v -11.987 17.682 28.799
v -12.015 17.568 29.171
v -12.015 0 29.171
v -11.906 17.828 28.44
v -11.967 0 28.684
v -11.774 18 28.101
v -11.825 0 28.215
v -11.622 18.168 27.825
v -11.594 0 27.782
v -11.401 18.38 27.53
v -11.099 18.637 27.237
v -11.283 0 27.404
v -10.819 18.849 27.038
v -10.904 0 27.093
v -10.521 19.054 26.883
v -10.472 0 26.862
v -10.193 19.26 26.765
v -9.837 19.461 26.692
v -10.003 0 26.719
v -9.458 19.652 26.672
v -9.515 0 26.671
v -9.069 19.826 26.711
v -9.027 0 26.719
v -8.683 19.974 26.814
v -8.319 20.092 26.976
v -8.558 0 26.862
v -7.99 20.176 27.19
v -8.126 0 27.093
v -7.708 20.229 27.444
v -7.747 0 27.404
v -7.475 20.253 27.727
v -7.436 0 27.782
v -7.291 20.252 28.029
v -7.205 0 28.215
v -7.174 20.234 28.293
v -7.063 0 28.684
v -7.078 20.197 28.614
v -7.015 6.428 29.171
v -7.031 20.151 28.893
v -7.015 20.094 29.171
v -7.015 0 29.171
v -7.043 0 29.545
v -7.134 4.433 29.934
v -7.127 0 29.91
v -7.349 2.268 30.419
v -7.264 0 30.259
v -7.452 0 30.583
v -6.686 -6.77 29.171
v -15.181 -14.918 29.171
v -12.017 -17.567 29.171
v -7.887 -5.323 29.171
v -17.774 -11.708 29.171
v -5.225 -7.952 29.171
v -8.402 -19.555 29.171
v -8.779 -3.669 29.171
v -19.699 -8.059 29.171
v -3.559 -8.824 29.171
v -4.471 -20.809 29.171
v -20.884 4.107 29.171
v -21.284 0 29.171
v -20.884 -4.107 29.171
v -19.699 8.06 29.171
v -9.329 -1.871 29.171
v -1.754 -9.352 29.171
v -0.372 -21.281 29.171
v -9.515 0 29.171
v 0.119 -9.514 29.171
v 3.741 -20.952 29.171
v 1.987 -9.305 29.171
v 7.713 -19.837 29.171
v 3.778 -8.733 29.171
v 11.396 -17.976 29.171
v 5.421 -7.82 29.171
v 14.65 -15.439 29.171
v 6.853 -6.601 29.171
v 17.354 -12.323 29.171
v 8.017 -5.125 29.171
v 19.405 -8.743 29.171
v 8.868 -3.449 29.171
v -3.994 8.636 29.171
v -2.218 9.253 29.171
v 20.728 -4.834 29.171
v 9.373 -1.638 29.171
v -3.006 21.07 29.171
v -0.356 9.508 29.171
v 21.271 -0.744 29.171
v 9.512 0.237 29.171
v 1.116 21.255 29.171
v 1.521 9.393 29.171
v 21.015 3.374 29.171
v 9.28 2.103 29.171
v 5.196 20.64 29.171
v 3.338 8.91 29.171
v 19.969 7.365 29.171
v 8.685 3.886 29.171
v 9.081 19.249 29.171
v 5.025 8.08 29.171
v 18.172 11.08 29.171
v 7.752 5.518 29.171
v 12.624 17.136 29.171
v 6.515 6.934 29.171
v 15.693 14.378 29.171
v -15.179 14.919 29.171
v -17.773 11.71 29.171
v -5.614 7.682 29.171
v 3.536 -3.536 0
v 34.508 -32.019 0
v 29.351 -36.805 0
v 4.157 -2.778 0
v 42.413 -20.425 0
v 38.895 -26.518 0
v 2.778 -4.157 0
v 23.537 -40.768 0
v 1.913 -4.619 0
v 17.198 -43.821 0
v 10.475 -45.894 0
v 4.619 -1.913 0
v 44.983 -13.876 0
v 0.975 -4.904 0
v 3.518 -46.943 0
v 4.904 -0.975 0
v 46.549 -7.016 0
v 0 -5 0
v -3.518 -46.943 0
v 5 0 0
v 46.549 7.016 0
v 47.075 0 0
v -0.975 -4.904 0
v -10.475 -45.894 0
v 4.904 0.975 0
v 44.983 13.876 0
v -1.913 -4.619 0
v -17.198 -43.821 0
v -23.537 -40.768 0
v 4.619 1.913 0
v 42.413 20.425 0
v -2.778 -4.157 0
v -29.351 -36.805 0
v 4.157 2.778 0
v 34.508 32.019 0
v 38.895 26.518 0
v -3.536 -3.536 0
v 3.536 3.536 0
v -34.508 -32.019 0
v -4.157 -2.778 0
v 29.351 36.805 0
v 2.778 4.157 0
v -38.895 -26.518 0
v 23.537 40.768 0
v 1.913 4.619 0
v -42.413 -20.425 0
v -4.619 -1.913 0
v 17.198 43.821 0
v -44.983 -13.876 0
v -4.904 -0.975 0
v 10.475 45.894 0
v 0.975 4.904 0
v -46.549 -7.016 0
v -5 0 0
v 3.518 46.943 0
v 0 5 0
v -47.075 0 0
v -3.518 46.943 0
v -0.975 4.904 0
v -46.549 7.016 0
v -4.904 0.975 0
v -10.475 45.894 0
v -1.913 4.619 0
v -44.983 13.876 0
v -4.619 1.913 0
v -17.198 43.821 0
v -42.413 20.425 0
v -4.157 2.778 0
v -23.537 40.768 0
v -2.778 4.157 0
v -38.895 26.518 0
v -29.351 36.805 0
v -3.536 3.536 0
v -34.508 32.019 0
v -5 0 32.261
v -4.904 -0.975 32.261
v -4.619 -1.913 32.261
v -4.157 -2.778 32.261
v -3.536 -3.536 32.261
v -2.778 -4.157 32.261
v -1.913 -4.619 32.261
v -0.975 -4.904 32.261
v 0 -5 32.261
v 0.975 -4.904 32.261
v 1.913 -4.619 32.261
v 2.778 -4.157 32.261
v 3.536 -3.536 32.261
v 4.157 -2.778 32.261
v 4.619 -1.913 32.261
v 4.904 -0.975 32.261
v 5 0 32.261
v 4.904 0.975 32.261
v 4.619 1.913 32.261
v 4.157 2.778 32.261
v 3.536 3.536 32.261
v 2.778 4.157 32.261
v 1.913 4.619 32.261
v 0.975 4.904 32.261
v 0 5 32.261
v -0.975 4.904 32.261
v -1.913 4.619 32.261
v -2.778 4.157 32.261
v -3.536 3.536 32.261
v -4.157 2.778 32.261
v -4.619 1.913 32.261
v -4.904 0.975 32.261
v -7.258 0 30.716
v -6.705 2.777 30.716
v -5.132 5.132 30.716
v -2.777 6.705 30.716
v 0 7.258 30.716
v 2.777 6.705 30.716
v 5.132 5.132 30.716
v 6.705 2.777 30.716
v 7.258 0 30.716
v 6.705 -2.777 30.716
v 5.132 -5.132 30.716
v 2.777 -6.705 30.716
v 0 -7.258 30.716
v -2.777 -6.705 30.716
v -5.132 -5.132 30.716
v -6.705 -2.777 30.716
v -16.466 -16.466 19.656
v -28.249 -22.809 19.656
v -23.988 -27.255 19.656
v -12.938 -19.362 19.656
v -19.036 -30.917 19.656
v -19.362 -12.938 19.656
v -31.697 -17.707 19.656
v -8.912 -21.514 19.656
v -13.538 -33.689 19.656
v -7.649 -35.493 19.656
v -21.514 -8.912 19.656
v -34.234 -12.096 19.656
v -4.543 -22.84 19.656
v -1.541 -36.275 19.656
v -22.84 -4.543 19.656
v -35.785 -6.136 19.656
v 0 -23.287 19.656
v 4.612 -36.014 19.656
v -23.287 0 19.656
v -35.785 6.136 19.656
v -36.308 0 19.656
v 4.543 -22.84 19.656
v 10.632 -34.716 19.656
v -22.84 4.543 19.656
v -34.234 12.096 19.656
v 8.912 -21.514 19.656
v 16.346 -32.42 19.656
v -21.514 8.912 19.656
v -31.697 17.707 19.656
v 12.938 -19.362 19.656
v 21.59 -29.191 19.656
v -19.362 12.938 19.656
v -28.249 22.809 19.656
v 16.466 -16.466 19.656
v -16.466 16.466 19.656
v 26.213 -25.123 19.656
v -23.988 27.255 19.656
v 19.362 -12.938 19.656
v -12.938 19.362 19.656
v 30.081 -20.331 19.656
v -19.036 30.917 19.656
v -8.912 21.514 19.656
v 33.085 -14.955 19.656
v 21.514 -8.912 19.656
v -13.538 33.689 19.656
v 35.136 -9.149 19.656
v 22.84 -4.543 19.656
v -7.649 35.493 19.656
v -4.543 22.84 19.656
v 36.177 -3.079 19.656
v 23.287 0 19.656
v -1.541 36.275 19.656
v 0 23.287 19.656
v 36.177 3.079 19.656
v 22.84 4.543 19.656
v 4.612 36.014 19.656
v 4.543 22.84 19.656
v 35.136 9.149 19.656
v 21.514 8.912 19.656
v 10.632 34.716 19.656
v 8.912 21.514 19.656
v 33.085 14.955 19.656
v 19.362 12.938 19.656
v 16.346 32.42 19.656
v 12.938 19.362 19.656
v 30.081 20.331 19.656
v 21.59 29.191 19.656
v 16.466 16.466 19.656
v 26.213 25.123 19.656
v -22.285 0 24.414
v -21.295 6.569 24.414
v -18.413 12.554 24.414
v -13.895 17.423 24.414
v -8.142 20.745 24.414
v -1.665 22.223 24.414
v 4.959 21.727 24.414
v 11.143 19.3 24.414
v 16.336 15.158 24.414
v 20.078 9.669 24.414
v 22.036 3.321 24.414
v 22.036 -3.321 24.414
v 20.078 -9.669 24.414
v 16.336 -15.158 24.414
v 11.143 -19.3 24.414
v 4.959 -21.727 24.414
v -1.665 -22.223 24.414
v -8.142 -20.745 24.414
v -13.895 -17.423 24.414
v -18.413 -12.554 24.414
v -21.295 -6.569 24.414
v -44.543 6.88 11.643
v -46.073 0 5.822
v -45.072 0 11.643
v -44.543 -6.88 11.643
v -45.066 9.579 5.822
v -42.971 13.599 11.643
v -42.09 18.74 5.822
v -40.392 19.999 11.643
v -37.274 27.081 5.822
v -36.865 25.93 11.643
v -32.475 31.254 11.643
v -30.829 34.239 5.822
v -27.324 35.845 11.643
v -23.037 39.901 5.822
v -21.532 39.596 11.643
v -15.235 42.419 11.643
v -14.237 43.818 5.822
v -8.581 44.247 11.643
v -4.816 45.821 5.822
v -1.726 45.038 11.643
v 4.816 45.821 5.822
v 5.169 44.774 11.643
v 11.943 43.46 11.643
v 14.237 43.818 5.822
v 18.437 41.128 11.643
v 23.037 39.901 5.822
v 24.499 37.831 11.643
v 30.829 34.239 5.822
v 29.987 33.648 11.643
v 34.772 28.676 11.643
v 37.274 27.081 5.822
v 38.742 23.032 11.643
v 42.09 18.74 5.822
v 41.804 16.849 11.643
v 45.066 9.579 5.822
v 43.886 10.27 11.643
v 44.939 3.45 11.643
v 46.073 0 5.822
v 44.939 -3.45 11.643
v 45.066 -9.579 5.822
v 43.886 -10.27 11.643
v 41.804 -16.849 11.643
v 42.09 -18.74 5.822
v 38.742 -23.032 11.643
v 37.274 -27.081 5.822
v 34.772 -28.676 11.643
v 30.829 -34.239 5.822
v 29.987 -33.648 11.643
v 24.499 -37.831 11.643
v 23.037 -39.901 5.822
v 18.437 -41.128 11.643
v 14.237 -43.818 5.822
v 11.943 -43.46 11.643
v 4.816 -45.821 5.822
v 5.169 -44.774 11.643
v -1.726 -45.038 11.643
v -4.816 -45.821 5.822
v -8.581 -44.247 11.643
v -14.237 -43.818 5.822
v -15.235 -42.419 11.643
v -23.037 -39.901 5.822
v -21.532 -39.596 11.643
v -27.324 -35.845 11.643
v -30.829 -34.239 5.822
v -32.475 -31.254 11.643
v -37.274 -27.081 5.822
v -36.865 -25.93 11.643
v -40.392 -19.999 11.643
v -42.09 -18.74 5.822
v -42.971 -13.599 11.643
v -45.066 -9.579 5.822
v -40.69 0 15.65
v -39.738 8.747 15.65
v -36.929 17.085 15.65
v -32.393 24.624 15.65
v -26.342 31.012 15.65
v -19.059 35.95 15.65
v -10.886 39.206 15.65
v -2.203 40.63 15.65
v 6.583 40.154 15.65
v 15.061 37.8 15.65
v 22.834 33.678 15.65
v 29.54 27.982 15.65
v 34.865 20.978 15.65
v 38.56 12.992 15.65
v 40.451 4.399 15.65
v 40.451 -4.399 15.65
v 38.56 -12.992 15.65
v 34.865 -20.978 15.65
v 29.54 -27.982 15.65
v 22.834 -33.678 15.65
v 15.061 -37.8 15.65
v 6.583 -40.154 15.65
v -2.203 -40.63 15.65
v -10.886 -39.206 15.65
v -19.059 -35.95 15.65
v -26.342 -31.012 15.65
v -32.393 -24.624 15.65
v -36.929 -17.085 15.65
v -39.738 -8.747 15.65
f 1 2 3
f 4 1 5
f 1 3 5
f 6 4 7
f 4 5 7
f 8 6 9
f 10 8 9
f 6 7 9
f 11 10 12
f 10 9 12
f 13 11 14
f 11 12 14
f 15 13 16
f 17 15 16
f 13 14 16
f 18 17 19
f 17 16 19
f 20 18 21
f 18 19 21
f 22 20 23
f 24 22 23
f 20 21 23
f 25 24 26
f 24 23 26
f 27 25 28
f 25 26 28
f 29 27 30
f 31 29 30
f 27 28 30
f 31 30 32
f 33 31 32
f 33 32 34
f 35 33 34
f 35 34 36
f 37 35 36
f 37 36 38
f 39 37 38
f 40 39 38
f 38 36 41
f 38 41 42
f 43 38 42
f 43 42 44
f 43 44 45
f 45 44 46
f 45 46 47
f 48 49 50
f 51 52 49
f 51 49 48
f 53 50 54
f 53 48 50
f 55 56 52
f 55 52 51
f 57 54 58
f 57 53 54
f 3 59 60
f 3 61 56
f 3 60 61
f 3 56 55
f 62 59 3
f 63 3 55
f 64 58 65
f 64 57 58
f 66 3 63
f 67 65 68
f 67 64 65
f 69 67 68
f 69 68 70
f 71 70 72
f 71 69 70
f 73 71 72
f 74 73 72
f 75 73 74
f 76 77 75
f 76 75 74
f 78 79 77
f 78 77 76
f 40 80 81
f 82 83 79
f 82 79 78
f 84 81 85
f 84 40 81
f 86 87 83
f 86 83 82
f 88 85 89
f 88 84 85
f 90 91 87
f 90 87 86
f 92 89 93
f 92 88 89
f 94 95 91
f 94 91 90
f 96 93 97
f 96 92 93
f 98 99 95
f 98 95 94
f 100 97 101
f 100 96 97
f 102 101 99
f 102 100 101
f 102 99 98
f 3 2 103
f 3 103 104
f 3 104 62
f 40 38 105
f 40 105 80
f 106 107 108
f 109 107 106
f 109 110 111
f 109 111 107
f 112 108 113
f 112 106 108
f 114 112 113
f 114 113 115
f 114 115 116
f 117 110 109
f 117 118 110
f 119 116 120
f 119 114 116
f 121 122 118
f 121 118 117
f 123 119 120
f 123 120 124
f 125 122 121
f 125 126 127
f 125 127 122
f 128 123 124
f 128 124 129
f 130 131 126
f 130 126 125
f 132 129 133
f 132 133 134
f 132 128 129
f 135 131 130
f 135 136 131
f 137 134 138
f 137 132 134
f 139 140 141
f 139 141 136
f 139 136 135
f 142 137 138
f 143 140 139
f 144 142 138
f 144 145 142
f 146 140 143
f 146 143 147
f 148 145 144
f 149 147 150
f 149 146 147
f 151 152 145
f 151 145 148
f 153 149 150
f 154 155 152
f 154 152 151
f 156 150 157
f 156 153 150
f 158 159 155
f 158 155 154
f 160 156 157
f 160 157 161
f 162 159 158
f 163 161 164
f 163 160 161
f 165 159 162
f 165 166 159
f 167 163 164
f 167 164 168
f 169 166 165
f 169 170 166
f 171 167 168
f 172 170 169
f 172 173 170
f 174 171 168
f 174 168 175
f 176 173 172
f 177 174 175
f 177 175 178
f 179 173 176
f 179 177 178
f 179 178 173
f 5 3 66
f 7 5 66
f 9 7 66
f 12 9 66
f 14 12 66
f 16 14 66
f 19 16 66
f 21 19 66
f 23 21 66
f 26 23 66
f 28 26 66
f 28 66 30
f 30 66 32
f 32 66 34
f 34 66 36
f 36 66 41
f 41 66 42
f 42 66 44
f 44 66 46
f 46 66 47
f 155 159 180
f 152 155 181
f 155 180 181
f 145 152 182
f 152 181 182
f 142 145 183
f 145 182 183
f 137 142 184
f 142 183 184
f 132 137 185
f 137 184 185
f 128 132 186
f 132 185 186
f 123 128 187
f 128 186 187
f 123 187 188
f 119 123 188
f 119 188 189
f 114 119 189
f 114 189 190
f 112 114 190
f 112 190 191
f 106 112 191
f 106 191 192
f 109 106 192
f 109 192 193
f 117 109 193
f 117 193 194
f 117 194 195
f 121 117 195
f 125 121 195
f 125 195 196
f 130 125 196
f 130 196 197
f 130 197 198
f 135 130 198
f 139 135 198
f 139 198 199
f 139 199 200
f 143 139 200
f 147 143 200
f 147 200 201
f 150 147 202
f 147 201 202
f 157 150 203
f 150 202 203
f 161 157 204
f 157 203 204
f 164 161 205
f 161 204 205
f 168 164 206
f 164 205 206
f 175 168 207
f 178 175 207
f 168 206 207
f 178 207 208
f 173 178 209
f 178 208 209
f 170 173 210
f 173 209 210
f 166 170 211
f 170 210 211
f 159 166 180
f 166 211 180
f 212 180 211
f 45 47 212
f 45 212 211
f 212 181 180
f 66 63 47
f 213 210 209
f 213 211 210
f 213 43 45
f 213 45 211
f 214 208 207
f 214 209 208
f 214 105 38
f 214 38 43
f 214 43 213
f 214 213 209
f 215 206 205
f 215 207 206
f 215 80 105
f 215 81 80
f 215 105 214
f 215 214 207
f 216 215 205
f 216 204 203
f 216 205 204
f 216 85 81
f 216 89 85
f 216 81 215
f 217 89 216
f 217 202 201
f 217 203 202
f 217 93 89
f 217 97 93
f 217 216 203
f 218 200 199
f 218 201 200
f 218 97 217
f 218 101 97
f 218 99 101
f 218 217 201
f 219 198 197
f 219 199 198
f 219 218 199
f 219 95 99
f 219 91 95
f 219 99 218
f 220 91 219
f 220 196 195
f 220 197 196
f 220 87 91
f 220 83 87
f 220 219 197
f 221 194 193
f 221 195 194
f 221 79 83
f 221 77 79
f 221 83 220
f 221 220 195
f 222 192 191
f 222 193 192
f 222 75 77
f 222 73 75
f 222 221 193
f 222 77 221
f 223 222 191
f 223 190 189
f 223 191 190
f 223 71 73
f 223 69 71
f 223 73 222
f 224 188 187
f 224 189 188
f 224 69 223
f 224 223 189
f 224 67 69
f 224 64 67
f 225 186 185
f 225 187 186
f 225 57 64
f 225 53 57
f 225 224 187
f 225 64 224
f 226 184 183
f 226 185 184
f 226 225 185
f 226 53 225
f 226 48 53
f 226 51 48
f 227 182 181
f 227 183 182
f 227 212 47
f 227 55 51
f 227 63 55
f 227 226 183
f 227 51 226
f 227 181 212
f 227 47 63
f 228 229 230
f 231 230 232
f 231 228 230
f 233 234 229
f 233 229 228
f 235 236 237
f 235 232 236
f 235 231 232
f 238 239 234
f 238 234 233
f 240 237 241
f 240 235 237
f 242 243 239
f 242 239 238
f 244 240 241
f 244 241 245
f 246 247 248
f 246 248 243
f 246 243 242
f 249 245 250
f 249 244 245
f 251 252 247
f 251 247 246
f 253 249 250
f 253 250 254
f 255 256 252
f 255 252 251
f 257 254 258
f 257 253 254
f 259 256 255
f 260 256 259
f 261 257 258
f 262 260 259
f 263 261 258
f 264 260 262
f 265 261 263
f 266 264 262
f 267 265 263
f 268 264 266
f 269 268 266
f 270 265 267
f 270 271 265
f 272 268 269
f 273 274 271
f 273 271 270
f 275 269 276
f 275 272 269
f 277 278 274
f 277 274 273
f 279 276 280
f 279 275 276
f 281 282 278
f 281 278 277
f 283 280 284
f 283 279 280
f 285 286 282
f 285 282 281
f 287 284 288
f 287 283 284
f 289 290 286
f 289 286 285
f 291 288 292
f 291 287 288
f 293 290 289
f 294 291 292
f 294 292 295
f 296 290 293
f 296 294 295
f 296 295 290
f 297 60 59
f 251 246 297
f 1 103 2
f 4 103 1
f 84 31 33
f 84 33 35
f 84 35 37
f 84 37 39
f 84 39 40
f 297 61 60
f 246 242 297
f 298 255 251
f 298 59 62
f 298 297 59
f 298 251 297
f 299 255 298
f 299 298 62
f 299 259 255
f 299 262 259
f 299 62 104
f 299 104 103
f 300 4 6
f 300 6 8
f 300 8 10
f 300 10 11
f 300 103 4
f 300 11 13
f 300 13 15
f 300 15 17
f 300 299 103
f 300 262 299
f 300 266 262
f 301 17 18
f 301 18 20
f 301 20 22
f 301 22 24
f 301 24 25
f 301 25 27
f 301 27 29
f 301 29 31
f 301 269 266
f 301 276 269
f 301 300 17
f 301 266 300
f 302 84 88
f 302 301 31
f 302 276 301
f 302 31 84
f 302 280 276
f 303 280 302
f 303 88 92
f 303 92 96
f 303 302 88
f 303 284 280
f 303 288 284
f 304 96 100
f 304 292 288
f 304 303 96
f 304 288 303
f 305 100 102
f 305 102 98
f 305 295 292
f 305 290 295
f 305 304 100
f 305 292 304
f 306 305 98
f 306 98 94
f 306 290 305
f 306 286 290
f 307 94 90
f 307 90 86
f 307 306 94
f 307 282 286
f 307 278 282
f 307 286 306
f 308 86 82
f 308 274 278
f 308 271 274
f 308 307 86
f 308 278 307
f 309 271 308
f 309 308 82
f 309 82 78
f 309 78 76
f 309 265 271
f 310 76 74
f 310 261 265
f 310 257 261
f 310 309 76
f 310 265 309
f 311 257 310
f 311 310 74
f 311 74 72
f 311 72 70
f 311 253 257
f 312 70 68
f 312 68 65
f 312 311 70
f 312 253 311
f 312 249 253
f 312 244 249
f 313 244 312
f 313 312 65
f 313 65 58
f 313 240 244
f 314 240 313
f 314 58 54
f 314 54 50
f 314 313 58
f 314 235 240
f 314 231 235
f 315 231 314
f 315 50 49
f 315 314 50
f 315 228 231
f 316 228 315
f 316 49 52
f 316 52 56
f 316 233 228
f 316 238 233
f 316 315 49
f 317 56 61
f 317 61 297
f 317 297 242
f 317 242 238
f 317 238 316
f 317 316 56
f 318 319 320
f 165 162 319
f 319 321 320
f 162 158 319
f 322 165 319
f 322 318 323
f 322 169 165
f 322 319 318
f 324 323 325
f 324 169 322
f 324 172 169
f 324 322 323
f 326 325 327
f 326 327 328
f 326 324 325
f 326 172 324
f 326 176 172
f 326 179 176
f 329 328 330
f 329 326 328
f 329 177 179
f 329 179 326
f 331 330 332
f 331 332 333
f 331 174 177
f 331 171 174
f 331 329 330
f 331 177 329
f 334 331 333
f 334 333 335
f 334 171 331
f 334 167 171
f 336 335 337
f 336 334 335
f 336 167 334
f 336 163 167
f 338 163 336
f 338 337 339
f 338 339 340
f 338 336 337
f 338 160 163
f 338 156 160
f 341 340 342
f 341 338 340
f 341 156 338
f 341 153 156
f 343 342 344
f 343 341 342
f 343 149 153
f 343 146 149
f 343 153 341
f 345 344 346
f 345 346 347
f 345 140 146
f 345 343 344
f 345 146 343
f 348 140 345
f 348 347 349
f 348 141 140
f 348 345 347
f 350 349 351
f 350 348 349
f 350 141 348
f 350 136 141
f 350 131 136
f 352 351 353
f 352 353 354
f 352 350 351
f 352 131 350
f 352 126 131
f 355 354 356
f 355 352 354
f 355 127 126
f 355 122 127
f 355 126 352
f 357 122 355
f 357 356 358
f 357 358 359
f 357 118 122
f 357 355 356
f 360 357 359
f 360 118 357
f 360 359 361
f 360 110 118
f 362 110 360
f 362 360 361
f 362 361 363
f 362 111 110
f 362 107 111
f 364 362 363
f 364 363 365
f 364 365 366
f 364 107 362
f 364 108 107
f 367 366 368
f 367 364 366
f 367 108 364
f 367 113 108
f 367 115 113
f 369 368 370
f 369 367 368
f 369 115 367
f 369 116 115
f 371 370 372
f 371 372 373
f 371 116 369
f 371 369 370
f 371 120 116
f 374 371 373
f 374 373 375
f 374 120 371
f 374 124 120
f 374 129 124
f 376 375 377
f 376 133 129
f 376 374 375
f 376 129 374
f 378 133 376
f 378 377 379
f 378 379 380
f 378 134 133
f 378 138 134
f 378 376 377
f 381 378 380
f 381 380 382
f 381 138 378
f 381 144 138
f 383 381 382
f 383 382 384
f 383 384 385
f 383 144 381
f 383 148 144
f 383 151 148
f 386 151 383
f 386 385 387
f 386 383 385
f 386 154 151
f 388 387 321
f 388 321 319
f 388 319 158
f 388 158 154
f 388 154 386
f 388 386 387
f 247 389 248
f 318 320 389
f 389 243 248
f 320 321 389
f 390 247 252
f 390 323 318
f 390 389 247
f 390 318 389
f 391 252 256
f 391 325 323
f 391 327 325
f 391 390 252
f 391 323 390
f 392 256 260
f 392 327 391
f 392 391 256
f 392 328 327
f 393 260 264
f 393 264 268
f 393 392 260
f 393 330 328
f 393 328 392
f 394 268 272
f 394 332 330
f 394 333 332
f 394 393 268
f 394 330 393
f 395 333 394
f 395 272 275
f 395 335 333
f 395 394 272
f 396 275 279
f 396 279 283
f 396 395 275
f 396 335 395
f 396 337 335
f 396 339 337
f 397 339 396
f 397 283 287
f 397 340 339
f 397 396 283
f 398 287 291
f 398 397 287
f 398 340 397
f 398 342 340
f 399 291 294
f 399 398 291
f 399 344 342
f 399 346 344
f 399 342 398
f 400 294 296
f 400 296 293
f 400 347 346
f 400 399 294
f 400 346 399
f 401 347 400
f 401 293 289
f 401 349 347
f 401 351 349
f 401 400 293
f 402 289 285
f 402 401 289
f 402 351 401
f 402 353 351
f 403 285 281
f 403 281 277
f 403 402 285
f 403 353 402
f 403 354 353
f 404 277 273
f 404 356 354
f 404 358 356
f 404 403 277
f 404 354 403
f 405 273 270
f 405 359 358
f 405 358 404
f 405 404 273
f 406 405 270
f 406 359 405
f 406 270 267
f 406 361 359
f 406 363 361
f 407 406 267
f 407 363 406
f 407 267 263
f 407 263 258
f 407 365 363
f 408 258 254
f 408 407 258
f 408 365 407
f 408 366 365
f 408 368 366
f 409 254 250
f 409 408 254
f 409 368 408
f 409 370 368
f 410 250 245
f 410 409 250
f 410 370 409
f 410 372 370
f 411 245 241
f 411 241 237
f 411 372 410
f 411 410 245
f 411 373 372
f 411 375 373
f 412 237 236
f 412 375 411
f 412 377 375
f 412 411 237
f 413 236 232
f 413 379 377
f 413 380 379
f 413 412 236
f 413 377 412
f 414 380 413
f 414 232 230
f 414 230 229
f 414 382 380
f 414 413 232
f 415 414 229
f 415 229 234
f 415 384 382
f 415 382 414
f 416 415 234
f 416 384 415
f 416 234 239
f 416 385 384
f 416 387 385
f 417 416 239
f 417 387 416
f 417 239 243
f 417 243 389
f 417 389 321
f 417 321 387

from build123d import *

# Parameters (mm, degrees)
F3_D     = 5
F3_DEPTH = 47.0757239888
F4_D     = 10


with BuildPart() as f1:
    # F0 (on Front) → F1 (revolve)
    with BuildSketch(Plane.XZ):
        Polygon((0, 0), (0, 35.6816388667), (-9.515103884, 29.1713047773), (-21.2837848812, 29.1713047773), (-23.2869647443, 19.6562018245), (-36.3076329231, 19.6562018245), (-45.071542263, 11.6434814408), (-47.0747239888, 0), align=None)
    revolve(axis=Axis((0, 0, 17.8408194333), (0, 0, -1)))

    # F3 (through all, one way)
    with BuildSketch(Plane.XZ):
        with Locations((0, 35.6816388667), (-9.515103884, 29.1713047773)):
            Circle(F3_D / 2)
    extrude(amount=-F3_DEPTH, mode=Mode.SUBTRACT)

    # F4 (through all)
    with Locations(Plane(origin=(0, 0, 0), x_dir=(1, 0, 0), z_dir=(0, 0, -1))):
        with Locations((0, 0)):
            Hole(F4_D / 2)


solid = f1.part
